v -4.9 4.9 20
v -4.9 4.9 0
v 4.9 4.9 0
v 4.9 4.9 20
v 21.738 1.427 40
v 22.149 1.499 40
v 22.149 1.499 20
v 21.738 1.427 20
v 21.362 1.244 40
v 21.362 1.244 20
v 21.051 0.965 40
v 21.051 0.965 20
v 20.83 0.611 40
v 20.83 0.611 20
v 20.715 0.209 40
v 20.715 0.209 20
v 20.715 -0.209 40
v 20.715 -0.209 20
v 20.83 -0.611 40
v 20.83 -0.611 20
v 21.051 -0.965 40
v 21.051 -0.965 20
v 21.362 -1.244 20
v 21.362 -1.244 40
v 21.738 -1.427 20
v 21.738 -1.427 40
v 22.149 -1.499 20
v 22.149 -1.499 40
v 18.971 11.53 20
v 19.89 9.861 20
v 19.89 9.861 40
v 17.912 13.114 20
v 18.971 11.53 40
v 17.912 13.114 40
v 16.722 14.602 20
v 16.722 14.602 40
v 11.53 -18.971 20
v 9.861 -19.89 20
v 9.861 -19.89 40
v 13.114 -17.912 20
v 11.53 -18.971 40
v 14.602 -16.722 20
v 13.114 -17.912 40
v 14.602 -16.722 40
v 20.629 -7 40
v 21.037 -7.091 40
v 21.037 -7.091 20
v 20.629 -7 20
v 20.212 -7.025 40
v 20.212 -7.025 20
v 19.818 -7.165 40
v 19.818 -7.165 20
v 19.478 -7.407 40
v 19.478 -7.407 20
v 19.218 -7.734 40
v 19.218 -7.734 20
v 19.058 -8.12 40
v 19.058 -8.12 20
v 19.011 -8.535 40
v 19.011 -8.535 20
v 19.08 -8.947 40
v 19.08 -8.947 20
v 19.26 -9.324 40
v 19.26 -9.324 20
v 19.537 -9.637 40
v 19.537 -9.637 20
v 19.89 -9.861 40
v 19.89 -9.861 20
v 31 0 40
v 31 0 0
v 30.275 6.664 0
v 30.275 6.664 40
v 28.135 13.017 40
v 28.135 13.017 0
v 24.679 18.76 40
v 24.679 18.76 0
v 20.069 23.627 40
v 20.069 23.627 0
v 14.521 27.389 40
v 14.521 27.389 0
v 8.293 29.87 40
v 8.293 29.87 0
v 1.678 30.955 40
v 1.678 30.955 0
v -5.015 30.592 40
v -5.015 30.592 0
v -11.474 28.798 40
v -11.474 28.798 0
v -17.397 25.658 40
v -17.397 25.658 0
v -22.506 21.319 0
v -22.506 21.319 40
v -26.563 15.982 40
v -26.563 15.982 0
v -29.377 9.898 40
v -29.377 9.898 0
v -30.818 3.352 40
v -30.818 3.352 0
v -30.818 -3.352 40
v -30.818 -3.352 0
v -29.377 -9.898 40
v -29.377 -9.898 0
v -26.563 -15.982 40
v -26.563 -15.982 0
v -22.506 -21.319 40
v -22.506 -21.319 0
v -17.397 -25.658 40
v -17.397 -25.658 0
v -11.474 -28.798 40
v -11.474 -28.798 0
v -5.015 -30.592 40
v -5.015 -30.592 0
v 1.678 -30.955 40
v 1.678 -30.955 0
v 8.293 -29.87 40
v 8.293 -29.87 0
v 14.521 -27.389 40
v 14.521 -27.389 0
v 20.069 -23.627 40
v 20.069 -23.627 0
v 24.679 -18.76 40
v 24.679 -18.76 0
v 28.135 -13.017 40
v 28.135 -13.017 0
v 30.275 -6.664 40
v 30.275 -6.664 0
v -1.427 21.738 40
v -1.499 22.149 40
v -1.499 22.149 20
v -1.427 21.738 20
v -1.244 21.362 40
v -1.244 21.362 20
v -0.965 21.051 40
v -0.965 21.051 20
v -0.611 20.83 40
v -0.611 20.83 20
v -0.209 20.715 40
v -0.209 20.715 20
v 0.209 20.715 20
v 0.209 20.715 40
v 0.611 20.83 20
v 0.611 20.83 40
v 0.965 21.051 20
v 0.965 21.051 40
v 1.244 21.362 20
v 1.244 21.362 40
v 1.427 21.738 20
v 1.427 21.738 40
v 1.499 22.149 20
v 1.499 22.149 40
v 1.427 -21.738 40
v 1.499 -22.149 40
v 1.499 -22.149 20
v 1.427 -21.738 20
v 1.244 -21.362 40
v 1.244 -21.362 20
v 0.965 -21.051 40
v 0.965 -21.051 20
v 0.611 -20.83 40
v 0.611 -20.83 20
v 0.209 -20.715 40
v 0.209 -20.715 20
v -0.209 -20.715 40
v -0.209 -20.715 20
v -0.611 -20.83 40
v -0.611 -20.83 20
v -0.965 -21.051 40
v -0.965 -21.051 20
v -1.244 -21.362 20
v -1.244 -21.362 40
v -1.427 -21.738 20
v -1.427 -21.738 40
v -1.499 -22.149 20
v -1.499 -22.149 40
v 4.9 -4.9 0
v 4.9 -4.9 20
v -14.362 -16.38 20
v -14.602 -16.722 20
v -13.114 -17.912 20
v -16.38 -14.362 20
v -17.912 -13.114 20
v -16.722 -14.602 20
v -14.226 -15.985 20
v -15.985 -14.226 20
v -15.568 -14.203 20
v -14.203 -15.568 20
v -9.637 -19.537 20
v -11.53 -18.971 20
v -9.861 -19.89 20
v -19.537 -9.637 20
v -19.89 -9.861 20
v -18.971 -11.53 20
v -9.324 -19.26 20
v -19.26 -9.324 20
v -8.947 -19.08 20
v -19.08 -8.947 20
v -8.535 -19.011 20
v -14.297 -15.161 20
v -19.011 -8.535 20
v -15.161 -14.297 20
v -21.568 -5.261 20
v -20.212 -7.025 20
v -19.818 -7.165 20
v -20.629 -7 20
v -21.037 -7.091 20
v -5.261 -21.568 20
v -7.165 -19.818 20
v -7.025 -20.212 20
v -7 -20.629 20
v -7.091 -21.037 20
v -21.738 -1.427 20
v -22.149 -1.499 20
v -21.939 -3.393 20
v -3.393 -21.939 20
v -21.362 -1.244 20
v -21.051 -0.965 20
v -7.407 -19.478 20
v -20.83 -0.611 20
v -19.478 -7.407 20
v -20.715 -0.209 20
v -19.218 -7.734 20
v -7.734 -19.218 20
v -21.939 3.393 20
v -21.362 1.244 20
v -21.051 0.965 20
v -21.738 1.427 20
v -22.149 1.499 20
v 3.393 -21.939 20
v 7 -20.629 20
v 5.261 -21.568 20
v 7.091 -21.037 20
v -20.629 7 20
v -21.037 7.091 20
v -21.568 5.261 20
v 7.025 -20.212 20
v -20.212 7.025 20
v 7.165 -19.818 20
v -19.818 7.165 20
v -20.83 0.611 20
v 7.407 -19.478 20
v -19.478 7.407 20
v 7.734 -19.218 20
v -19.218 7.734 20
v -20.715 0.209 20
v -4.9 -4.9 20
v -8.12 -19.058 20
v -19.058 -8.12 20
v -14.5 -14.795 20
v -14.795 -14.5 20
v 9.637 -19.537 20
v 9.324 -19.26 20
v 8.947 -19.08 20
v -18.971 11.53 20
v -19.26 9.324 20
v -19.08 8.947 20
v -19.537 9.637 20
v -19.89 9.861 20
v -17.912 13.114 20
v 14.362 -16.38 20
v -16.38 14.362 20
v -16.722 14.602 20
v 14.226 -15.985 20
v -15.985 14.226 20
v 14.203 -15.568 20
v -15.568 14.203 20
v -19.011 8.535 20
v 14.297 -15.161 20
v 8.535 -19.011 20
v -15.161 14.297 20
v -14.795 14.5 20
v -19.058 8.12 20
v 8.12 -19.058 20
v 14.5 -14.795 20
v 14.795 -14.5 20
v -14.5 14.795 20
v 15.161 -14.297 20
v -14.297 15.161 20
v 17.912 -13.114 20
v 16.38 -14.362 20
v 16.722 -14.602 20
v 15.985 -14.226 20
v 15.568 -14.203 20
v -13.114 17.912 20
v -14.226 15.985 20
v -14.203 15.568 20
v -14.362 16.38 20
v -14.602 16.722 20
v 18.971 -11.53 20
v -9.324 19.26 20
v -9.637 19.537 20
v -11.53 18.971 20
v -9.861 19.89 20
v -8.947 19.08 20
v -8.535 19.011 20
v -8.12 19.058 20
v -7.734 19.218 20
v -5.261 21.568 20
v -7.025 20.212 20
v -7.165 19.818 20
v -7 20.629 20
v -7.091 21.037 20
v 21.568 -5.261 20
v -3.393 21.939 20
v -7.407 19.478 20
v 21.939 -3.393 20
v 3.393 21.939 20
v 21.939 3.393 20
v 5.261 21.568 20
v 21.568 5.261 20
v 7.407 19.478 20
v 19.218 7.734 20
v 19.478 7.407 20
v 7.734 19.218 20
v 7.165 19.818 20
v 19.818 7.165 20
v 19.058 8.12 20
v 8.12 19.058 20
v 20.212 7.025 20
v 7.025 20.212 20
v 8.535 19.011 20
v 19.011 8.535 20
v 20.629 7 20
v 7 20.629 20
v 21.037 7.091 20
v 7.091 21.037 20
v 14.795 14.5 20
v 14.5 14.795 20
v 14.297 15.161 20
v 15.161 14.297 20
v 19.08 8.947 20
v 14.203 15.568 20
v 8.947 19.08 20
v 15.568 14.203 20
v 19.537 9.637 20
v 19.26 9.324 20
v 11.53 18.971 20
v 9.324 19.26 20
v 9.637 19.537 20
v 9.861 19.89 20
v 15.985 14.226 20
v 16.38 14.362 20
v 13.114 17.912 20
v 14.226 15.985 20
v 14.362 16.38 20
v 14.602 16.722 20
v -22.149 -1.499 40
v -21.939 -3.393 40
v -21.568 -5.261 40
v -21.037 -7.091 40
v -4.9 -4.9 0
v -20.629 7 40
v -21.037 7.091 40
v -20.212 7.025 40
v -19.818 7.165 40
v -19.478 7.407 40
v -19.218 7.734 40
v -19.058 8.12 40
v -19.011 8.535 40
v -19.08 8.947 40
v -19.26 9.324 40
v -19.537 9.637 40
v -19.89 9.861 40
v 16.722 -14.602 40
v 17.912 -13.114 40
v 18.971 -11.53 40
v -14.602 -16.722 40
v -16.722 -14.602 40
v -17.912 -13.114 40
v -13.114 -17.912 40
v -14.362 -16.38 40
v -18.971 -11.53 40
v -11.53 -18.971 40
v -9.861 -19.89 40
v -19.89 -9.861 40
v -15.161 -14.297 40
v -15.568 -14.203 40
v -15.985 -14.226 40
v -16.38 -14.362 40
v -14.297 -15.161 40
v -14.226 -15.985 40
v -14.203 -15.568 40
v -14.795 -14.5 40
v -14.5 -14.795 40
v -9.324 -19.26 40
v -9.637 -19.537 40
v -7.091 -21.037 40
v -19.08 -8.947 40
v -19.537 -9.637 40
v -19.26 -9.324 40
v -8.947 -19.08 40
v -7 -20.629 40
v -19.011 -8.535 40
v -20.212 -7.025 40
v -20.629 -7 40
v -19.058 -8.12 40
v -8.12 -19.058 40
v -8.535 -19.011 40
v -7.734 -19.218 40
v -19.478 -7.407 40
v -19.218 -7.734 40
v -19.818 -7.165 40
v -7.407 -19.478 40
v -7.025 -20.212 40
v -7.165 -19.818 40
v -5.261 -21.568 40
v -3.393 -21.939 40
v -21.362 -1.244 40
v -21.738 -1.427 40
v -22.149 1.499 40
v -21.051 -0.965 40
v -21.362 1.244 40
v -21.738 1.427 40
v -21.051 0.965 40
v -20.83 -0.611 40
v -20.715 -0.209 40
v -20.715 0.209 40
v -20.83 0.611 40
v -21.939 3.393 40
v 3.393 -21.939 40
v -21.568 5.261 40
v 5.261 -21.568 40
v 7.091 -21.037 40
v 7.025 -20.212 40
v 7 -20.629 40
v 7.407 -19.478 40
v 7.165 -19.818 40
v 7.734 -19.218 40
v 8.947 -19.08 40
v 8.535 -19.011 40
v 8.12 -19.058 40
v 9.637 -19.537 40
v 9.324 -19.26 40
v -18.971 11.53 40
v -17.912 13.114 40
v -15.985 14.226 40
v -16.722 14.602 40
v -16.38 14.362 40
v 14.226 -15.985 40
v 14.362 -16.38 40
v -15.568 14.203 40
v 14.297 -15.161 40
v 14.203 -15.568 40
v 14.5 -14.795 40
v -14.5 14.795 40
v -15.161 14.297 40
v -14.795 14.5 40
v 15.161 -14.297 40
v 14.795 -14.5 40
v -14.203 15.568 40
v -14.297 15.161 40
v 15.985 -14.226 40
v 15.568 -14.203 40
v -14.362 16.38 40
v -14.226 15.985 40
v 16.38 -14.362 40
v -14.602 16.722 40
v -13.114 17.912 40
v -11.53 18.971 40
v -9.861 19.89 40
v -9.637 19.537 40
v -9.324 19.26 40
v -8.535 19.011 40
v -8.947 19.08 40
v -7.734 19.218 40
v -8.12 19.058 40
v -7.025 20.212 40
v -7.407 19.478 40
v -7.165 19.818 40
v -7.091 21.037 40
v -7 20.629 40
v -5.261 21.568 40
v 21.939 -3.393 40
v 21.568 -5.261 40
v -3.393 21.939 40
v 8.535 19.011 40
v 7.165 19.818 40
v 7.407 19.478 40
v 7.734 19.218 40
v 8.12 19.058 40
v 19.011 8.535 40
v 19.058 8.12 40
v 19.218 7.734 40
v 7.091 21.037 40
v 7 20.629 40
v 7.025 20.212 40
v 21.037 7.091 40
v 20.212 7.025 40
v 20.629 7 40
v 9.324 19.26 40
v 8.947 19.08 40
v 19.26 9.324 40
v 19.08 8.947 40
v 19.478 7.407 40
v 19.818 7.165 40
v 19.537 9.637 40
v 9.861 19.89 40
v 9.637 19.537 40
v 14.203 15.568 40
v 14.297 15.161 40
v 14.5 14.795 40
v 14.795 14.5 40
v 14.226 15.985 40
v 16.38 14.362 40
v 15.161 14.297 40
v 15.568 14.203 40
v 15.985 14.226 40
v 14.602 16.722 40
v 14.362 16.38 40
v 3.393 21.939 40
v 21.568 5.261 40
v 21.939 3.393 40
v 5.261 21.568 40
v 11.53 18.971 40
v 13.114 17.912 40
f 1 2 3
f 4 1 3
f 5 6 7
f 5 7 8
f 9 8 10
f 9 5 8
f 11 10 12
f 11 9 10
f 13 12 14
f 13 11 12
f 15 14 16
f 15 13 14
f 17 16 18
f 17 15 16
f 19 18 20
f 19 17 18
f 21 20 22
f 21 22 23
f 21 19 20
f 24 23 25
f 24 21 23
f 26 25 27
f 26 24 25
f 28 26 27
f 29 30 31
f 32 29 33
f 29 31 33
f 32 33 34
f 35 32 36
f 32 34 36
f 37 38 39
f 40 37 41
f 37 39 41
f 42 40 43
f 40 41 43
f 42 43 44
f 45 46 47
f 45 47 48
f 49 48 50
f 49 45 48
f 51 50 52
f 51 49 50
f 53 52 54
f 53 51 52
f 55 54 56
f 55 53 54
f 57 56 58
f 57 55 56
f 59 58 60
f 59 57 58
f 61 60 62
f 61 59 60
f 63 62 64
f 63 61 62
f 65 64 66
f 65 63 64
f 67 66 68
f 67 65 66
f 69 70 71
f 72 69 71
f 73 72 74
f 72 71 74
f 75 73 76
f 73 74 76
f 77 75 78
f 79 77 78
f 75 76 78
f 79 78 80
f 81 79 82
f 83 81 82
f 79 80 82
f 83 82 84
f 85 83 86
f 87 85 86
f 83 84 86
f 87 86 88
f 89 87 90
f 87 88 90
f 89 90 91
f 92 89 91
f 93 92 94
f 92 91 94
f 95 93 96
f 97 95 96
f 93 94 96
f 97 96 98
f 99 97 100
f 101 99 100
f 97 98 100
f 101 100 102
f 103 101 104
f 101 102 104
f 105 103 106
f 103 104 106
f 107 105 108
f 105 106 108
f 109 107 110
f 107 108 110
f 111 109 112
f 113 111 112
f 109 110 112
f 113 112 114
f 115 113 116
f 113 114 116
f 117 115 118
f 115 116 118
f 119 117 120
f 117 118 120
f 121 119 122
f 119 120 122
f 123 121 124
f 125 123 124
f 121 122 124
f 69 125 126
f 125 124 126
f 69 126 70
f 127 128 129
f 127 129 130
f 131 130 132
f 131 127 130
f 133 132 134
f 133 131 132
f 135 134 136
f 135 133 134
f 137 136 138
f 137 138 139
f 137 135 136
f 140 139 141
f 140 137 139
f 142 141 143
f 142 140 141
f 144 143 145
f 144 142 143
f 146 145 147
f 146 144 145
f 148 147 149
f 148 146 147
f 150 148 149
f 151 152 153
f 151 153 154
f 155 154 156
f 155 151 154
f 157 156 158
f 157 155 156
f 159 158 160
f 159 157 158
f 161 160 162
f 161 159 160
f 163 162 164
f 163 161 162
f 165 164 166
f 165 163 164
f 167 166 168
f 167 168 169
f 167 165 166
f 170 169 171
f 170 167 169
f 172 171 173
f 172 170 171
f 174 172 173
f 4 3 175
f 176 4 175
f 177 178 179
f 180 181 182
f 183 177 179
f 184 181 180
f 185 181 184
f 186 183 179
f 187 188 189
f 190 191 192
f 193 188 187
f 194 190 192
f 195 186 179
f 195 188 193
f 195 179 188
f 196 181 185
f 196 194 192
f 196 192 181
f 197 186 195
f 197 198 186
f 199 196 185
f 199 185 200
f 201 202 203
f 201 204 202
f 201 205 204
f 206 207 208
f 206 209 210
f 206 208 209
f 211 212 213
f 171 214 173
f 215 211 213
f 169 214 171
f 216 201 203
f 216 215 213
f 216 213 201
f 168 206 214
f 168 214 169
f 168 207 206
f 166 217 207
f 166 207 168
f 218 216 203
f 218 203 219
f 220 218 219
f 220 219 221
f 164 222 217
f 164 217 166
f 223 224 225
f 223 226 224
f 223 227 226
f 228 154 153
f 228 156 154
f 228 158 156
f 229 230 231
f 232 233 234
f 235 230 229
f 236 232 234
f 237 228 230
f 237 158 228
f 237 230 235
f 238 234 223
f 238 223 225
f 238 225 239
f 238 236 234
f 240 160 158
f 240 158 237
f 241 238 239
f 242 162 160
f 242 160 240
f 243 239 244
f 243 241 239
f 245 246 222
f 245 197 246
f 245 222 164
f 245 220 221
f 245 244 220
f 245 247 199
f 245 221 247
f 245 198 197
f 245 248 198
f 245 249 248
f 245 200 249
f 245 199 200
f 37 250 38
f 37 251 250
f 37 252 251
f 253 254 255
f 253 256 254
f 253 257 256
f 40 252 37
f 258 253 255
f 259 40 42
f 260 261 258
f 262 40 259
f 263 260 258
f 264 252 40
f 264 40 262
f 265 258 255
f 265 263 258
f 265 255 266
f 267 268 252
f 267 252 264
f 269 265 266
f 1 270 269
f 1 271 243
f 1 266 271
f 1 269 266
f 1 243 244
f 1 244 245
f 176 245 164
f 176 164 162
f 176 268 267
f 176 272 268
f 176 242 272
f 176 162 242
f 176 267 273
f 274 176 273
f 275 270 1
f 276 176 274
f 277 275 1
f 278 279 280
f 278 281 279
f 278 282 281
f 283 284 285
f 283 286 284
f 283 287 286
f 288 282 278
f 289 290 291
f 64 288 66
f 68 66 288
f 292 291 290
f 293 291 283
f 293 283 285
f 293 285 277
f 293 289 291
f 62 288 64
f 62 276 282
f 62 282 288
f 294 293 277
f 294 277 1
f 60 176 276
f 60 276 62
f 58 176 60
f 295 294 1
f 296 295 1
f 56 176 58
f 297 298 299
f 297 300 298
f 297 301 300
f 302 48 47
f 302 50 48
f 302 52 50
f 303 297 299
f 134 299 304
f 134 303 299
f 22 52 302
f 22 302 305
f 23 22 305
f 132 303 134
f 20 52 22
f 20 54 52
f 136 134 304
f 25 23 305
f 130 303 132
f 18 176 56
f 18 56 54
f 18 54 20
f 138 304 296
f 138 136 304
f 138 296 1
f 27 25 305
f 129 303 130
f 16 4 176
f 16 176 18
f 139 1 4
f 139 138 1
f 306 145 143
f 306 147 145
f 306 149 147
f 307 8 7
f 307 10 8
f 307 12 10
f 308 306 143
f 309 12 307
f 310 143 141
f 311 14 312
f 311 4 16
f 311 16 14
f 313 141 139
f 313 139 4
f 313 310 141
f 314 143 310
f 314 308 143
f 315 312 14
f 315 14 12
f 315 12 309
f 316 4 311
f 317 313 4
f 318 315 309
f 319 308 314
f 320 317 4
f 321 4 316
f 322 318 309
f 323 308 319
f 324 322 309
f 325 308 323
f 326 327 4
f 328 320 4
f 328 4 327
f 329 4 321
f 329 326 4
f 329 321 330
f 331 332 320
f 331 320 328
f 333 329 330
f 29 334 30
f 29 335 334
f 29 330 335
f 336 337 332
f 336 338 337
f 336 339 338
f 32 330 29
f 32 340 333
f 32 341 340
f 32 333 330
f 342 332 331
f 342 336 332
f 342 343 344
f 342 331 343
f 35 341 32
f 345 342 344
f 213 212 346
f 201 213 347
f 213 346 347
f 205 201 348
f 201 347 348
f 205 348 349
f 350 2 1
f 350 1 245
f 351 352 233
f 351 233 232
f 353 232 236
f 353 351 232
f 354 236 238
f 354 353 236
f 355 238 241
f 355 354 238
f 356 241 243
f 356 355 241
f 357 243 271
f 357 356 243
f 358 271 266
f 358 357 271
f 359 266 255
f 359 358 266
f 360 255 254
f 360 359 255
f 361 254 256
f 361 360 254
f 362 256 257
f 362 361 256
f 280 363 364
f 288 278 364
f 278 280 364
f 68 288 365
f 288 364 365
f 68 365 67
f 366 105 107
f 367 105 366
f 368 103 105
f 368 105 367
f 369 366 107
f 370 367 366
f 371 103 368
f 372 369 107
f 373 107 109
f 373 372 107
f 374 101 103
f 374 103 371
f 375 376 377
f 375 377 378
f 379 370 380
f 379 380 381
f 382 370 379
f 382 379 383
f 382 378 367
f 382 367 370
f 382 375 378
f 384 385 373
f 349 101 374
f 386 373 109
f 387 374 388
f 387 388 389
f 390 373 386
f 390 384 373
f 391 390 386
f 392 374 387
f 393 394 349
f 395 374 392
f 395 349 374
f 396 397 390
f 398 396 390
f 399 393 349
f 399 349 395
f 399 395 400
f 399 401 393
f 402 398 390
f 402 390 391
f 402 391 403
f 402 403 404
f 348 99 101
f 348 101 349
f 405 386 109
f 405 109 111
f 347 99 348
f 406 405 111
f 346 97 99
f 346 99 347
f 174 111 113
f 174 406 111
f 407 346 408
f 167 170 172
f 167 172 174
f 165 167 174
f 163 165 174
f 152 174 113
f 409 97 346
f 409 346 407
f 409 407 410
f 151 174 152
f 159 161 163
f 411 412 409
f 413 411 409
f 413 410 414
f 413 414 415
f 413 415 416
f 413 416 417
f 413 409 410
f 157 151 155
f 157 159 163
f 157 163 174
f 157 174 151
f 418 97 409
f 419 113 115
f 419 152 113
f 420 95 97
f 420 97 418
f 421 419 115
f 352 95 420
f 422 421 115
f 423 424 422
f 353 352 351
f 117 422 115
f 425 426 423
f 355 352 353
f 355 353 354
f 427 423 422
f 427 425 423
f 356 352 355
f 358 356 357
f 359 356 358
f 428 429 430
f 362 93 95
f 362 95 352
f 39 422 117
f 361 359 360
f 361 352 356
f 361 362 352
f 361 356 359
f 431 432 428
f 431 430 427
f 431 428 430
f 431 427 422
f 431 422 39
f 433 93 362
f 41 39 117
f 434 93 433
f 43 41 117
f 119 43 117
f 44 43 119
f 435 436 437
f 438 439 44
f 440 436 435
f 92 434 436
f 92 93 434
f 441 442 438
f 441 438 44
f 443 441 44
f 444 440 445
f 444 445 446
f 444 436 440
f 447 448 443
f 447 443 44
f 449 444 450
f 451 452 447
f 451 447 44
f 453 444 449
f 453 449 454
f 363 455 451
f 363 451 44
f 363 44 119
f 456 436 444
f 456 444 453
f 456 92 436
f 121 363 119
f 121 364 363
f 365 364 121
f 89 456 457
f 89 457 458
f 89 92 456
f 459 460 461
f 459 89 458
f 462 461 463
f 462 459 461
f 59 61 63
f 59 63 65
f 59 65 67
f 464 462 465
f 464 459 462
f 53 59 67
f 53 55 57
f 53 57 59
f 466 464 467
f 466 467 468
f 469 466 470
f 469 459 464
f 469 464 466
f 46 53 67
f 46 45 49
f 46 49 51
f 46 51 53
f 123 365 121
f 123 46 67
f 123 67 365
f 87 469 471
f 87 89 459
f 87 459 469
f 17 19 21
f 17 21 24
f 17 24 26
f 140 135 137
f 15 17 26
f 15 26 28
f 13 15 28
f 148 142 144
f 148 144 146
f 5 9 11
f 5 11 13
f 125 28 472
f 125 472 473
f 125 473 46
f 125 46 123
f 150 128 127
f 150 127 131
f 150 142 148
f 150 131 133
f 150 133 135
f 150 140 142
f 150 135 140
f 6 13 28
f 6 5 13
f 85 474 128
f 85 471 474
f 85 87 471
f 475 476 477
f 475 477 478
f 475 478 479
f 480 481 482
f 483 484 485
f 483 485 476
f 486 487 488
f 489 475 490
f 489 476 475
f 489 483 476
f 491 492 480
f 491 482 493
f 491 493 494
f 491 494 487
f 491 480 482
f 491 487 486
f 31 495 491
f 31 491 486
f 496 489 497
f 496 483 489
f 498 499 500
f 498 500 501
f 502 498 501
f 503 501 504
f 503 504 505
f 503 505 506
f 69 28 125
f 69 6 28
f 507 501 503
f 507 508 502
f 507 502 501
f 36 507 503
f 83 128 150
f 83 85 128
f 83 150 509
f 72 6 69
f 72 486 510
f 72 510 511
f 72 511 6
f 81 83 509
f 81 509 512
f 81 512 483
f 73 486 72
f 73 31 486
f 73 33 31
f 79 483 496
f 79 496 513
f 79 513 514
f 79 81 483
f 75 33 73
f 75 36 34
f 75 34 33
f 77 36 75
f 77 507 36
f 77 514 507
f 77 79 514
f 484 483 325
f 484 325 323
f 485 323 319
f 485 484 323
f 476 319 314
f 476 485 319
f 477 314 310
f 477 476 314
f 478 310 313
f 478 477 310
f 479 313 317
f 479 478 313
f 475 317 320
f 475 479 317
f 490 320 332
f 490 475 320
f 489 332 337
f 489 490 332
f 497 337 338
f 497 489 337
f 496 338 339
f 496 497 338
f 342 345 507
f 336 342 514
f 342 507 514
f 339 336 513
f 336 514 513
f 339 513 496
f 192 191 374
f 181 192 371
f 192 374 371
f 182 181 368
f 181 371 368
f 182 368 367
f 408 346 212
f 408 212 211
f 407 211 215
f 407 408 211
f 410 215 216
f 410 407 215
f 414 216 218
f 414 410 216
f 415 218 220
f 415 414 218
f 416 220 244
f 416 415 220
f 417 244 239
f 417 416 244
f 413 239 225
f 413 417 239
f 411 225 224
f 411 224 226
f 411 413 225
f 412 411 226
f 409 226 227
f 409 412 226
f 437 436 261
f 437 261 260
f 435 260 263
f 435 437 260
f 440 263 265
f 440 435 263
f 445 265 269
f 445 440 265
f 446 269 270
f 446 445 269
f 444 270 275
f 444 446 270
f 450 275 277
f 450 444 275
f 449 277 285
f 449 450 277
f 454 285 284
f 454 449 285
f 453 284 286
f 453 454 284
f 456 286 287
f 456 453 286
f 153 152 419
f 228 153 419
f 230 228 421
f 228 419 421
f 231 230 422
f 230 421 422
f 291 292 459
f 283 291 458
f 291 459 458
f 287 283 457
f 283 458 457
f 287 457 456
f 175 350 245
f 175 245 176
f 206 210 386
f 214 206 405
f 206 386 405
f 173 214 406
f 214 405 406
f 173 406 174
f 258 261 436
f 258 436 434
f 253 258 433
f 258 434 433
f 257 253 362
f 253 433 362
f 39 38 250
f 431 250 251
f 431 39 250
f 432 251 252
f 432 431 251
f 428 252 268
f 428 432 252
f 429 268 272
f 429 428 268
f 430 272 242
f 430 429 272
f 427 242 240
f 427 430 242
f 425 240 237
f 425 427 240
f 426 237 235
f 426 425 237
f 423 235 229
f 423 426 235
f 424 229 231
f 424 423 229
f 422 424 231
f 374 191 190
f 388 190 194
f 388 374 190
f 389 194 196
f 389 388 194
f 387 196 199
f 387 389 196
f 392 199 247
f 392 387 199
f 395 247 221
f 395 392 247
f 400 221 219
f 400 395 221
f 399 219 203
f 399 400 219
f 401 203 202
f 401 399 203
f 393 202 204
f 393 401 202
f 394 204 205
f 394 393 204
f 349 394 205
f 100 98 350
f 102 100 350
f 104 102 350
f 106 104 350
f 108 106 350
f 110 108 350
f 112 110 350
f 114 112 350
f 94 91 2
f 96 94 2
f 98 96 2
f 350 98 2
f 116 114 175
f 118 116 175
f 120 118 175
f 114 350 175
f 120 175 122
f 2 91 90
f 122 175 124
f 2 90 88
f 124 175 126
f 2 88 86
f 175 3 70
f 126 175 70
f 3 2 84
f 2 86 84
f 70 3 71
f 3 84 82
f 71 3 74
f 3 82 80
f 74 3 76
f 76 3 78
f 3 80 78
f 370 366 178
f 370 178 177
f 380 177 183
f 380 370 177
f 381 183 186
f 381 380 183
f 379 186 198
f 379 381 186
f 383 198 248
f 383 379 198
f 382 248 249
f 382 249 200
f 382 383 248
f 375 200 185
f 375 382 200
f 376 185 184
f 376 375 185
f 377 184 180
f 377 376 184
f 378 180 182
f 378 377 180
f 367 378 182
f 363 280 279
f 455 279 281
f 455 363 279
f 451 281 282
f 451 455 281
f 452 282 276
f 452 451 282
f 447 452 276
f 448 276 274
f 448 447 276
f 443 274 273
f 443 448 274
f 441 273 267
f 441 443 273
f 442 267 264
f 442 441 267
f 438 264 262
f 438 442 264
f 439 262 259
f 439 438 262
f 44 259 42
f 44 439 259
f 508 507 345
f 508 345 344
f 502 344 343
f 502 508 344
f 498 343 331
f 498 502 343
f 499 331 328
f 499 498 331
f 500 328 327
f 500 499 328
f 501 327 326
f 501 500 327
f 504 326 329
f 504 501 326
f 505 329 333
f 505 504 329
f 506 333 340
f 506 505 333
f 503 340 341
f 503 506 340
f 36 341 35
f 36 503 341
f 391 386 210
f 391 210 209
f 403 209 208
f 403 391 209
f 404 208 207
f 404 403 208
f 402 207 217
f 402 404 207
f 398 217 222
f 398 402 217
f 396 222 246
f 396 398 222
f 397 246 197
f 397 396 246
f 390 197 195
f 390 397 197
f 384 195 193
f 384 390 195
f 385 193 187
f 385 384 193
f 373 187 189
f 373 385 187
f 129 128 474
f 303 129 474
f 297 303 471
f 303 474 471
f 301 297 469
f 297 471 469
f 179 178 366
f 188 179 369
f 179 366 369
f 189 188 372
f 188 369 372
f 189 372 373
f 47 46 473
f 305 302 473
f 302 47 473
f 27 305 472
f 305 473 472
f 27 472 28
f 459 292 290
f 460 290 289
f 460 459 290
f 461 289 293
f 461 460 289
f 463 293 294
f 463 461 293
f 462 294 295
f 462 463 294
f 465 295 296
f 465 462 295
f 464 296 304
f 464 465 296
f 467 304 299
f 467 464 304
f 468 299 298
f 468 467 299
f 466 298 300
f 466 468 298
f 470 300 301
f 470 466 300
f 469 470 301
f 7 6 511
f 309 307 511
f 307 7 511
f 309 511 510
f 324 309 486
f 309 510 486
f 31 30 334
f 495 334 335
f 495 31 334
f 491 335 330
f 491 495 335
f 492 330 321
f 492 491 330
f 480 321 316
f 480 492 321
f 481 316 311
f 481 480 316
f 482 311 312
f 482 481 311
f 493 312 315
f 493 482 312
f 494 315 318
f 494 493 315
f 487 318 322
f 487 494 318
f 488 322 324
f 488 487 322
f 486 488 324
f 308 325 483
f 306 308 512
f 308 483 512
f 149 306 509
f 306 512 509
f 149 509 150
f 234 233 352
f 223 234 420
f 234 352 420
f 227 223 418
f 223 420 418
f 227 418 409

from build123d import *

# Parameters (mm, degrees)
SKETCH_R           = 31
PAD_DEPTH          = 40
SKETCH001_R        = 22.2
POCKET_DEPTH       = 20
SKETCH002_R        = 1.5
PAD001_DEPTH       = 25
POLARPATTERN_COUNT = 16
SKETCH003_W        = 9.8
SKETCH003_H        = 9.8
POCKET001_DEPTH    = 40.001


with BuildPart() as part:
    # Sketch → Pad (new body)
    with BuildSketch(Plane.XY):
        Circle(SKETCH_R)
    extrude(amount=PAD_DEPTH)

    # Sketch001 → Pocket (cut)
    with BuildSketch(Plane.XY.offset(40)):
        Circle(SKETCH001_R)
    extrude(amount=-POCKET_DEPTH, mode=Mode.SUBTRACT)

    # Sketch002 → Pad001 (new body)
    with BuildSketch(Plane.XY.offset(40)):
        with Locations((0, 22.2)):
            Circle(SKETCH002_R)
    pad001 = extrude(amount=-PAD001_DEPTH)

    # PolarPattern: Pad001 ×16 about axis
    polarpattern_axis = Axis((0, 0, 40), (0, 0, 1))
    for i in range(1, POLARPATTERN_COUNT):
        add(pad001.rotate(polarpattern_axis, i * 360 / POLARPATTERN_COUNT))

    # Sketch003 → Pocket001 (cut, through all)
    with BuildSketch(Plane(origin=(0, 0, 0), x_dir=(1, 0, 0), z_dir=(0, 0, -1))):
        Rectangle(SKETCH003_W, SKETCH003_H)
    extrude(amount=-POCKET001_DEPTH, mode=Mode.SUBTRACT)


solid = part.part
